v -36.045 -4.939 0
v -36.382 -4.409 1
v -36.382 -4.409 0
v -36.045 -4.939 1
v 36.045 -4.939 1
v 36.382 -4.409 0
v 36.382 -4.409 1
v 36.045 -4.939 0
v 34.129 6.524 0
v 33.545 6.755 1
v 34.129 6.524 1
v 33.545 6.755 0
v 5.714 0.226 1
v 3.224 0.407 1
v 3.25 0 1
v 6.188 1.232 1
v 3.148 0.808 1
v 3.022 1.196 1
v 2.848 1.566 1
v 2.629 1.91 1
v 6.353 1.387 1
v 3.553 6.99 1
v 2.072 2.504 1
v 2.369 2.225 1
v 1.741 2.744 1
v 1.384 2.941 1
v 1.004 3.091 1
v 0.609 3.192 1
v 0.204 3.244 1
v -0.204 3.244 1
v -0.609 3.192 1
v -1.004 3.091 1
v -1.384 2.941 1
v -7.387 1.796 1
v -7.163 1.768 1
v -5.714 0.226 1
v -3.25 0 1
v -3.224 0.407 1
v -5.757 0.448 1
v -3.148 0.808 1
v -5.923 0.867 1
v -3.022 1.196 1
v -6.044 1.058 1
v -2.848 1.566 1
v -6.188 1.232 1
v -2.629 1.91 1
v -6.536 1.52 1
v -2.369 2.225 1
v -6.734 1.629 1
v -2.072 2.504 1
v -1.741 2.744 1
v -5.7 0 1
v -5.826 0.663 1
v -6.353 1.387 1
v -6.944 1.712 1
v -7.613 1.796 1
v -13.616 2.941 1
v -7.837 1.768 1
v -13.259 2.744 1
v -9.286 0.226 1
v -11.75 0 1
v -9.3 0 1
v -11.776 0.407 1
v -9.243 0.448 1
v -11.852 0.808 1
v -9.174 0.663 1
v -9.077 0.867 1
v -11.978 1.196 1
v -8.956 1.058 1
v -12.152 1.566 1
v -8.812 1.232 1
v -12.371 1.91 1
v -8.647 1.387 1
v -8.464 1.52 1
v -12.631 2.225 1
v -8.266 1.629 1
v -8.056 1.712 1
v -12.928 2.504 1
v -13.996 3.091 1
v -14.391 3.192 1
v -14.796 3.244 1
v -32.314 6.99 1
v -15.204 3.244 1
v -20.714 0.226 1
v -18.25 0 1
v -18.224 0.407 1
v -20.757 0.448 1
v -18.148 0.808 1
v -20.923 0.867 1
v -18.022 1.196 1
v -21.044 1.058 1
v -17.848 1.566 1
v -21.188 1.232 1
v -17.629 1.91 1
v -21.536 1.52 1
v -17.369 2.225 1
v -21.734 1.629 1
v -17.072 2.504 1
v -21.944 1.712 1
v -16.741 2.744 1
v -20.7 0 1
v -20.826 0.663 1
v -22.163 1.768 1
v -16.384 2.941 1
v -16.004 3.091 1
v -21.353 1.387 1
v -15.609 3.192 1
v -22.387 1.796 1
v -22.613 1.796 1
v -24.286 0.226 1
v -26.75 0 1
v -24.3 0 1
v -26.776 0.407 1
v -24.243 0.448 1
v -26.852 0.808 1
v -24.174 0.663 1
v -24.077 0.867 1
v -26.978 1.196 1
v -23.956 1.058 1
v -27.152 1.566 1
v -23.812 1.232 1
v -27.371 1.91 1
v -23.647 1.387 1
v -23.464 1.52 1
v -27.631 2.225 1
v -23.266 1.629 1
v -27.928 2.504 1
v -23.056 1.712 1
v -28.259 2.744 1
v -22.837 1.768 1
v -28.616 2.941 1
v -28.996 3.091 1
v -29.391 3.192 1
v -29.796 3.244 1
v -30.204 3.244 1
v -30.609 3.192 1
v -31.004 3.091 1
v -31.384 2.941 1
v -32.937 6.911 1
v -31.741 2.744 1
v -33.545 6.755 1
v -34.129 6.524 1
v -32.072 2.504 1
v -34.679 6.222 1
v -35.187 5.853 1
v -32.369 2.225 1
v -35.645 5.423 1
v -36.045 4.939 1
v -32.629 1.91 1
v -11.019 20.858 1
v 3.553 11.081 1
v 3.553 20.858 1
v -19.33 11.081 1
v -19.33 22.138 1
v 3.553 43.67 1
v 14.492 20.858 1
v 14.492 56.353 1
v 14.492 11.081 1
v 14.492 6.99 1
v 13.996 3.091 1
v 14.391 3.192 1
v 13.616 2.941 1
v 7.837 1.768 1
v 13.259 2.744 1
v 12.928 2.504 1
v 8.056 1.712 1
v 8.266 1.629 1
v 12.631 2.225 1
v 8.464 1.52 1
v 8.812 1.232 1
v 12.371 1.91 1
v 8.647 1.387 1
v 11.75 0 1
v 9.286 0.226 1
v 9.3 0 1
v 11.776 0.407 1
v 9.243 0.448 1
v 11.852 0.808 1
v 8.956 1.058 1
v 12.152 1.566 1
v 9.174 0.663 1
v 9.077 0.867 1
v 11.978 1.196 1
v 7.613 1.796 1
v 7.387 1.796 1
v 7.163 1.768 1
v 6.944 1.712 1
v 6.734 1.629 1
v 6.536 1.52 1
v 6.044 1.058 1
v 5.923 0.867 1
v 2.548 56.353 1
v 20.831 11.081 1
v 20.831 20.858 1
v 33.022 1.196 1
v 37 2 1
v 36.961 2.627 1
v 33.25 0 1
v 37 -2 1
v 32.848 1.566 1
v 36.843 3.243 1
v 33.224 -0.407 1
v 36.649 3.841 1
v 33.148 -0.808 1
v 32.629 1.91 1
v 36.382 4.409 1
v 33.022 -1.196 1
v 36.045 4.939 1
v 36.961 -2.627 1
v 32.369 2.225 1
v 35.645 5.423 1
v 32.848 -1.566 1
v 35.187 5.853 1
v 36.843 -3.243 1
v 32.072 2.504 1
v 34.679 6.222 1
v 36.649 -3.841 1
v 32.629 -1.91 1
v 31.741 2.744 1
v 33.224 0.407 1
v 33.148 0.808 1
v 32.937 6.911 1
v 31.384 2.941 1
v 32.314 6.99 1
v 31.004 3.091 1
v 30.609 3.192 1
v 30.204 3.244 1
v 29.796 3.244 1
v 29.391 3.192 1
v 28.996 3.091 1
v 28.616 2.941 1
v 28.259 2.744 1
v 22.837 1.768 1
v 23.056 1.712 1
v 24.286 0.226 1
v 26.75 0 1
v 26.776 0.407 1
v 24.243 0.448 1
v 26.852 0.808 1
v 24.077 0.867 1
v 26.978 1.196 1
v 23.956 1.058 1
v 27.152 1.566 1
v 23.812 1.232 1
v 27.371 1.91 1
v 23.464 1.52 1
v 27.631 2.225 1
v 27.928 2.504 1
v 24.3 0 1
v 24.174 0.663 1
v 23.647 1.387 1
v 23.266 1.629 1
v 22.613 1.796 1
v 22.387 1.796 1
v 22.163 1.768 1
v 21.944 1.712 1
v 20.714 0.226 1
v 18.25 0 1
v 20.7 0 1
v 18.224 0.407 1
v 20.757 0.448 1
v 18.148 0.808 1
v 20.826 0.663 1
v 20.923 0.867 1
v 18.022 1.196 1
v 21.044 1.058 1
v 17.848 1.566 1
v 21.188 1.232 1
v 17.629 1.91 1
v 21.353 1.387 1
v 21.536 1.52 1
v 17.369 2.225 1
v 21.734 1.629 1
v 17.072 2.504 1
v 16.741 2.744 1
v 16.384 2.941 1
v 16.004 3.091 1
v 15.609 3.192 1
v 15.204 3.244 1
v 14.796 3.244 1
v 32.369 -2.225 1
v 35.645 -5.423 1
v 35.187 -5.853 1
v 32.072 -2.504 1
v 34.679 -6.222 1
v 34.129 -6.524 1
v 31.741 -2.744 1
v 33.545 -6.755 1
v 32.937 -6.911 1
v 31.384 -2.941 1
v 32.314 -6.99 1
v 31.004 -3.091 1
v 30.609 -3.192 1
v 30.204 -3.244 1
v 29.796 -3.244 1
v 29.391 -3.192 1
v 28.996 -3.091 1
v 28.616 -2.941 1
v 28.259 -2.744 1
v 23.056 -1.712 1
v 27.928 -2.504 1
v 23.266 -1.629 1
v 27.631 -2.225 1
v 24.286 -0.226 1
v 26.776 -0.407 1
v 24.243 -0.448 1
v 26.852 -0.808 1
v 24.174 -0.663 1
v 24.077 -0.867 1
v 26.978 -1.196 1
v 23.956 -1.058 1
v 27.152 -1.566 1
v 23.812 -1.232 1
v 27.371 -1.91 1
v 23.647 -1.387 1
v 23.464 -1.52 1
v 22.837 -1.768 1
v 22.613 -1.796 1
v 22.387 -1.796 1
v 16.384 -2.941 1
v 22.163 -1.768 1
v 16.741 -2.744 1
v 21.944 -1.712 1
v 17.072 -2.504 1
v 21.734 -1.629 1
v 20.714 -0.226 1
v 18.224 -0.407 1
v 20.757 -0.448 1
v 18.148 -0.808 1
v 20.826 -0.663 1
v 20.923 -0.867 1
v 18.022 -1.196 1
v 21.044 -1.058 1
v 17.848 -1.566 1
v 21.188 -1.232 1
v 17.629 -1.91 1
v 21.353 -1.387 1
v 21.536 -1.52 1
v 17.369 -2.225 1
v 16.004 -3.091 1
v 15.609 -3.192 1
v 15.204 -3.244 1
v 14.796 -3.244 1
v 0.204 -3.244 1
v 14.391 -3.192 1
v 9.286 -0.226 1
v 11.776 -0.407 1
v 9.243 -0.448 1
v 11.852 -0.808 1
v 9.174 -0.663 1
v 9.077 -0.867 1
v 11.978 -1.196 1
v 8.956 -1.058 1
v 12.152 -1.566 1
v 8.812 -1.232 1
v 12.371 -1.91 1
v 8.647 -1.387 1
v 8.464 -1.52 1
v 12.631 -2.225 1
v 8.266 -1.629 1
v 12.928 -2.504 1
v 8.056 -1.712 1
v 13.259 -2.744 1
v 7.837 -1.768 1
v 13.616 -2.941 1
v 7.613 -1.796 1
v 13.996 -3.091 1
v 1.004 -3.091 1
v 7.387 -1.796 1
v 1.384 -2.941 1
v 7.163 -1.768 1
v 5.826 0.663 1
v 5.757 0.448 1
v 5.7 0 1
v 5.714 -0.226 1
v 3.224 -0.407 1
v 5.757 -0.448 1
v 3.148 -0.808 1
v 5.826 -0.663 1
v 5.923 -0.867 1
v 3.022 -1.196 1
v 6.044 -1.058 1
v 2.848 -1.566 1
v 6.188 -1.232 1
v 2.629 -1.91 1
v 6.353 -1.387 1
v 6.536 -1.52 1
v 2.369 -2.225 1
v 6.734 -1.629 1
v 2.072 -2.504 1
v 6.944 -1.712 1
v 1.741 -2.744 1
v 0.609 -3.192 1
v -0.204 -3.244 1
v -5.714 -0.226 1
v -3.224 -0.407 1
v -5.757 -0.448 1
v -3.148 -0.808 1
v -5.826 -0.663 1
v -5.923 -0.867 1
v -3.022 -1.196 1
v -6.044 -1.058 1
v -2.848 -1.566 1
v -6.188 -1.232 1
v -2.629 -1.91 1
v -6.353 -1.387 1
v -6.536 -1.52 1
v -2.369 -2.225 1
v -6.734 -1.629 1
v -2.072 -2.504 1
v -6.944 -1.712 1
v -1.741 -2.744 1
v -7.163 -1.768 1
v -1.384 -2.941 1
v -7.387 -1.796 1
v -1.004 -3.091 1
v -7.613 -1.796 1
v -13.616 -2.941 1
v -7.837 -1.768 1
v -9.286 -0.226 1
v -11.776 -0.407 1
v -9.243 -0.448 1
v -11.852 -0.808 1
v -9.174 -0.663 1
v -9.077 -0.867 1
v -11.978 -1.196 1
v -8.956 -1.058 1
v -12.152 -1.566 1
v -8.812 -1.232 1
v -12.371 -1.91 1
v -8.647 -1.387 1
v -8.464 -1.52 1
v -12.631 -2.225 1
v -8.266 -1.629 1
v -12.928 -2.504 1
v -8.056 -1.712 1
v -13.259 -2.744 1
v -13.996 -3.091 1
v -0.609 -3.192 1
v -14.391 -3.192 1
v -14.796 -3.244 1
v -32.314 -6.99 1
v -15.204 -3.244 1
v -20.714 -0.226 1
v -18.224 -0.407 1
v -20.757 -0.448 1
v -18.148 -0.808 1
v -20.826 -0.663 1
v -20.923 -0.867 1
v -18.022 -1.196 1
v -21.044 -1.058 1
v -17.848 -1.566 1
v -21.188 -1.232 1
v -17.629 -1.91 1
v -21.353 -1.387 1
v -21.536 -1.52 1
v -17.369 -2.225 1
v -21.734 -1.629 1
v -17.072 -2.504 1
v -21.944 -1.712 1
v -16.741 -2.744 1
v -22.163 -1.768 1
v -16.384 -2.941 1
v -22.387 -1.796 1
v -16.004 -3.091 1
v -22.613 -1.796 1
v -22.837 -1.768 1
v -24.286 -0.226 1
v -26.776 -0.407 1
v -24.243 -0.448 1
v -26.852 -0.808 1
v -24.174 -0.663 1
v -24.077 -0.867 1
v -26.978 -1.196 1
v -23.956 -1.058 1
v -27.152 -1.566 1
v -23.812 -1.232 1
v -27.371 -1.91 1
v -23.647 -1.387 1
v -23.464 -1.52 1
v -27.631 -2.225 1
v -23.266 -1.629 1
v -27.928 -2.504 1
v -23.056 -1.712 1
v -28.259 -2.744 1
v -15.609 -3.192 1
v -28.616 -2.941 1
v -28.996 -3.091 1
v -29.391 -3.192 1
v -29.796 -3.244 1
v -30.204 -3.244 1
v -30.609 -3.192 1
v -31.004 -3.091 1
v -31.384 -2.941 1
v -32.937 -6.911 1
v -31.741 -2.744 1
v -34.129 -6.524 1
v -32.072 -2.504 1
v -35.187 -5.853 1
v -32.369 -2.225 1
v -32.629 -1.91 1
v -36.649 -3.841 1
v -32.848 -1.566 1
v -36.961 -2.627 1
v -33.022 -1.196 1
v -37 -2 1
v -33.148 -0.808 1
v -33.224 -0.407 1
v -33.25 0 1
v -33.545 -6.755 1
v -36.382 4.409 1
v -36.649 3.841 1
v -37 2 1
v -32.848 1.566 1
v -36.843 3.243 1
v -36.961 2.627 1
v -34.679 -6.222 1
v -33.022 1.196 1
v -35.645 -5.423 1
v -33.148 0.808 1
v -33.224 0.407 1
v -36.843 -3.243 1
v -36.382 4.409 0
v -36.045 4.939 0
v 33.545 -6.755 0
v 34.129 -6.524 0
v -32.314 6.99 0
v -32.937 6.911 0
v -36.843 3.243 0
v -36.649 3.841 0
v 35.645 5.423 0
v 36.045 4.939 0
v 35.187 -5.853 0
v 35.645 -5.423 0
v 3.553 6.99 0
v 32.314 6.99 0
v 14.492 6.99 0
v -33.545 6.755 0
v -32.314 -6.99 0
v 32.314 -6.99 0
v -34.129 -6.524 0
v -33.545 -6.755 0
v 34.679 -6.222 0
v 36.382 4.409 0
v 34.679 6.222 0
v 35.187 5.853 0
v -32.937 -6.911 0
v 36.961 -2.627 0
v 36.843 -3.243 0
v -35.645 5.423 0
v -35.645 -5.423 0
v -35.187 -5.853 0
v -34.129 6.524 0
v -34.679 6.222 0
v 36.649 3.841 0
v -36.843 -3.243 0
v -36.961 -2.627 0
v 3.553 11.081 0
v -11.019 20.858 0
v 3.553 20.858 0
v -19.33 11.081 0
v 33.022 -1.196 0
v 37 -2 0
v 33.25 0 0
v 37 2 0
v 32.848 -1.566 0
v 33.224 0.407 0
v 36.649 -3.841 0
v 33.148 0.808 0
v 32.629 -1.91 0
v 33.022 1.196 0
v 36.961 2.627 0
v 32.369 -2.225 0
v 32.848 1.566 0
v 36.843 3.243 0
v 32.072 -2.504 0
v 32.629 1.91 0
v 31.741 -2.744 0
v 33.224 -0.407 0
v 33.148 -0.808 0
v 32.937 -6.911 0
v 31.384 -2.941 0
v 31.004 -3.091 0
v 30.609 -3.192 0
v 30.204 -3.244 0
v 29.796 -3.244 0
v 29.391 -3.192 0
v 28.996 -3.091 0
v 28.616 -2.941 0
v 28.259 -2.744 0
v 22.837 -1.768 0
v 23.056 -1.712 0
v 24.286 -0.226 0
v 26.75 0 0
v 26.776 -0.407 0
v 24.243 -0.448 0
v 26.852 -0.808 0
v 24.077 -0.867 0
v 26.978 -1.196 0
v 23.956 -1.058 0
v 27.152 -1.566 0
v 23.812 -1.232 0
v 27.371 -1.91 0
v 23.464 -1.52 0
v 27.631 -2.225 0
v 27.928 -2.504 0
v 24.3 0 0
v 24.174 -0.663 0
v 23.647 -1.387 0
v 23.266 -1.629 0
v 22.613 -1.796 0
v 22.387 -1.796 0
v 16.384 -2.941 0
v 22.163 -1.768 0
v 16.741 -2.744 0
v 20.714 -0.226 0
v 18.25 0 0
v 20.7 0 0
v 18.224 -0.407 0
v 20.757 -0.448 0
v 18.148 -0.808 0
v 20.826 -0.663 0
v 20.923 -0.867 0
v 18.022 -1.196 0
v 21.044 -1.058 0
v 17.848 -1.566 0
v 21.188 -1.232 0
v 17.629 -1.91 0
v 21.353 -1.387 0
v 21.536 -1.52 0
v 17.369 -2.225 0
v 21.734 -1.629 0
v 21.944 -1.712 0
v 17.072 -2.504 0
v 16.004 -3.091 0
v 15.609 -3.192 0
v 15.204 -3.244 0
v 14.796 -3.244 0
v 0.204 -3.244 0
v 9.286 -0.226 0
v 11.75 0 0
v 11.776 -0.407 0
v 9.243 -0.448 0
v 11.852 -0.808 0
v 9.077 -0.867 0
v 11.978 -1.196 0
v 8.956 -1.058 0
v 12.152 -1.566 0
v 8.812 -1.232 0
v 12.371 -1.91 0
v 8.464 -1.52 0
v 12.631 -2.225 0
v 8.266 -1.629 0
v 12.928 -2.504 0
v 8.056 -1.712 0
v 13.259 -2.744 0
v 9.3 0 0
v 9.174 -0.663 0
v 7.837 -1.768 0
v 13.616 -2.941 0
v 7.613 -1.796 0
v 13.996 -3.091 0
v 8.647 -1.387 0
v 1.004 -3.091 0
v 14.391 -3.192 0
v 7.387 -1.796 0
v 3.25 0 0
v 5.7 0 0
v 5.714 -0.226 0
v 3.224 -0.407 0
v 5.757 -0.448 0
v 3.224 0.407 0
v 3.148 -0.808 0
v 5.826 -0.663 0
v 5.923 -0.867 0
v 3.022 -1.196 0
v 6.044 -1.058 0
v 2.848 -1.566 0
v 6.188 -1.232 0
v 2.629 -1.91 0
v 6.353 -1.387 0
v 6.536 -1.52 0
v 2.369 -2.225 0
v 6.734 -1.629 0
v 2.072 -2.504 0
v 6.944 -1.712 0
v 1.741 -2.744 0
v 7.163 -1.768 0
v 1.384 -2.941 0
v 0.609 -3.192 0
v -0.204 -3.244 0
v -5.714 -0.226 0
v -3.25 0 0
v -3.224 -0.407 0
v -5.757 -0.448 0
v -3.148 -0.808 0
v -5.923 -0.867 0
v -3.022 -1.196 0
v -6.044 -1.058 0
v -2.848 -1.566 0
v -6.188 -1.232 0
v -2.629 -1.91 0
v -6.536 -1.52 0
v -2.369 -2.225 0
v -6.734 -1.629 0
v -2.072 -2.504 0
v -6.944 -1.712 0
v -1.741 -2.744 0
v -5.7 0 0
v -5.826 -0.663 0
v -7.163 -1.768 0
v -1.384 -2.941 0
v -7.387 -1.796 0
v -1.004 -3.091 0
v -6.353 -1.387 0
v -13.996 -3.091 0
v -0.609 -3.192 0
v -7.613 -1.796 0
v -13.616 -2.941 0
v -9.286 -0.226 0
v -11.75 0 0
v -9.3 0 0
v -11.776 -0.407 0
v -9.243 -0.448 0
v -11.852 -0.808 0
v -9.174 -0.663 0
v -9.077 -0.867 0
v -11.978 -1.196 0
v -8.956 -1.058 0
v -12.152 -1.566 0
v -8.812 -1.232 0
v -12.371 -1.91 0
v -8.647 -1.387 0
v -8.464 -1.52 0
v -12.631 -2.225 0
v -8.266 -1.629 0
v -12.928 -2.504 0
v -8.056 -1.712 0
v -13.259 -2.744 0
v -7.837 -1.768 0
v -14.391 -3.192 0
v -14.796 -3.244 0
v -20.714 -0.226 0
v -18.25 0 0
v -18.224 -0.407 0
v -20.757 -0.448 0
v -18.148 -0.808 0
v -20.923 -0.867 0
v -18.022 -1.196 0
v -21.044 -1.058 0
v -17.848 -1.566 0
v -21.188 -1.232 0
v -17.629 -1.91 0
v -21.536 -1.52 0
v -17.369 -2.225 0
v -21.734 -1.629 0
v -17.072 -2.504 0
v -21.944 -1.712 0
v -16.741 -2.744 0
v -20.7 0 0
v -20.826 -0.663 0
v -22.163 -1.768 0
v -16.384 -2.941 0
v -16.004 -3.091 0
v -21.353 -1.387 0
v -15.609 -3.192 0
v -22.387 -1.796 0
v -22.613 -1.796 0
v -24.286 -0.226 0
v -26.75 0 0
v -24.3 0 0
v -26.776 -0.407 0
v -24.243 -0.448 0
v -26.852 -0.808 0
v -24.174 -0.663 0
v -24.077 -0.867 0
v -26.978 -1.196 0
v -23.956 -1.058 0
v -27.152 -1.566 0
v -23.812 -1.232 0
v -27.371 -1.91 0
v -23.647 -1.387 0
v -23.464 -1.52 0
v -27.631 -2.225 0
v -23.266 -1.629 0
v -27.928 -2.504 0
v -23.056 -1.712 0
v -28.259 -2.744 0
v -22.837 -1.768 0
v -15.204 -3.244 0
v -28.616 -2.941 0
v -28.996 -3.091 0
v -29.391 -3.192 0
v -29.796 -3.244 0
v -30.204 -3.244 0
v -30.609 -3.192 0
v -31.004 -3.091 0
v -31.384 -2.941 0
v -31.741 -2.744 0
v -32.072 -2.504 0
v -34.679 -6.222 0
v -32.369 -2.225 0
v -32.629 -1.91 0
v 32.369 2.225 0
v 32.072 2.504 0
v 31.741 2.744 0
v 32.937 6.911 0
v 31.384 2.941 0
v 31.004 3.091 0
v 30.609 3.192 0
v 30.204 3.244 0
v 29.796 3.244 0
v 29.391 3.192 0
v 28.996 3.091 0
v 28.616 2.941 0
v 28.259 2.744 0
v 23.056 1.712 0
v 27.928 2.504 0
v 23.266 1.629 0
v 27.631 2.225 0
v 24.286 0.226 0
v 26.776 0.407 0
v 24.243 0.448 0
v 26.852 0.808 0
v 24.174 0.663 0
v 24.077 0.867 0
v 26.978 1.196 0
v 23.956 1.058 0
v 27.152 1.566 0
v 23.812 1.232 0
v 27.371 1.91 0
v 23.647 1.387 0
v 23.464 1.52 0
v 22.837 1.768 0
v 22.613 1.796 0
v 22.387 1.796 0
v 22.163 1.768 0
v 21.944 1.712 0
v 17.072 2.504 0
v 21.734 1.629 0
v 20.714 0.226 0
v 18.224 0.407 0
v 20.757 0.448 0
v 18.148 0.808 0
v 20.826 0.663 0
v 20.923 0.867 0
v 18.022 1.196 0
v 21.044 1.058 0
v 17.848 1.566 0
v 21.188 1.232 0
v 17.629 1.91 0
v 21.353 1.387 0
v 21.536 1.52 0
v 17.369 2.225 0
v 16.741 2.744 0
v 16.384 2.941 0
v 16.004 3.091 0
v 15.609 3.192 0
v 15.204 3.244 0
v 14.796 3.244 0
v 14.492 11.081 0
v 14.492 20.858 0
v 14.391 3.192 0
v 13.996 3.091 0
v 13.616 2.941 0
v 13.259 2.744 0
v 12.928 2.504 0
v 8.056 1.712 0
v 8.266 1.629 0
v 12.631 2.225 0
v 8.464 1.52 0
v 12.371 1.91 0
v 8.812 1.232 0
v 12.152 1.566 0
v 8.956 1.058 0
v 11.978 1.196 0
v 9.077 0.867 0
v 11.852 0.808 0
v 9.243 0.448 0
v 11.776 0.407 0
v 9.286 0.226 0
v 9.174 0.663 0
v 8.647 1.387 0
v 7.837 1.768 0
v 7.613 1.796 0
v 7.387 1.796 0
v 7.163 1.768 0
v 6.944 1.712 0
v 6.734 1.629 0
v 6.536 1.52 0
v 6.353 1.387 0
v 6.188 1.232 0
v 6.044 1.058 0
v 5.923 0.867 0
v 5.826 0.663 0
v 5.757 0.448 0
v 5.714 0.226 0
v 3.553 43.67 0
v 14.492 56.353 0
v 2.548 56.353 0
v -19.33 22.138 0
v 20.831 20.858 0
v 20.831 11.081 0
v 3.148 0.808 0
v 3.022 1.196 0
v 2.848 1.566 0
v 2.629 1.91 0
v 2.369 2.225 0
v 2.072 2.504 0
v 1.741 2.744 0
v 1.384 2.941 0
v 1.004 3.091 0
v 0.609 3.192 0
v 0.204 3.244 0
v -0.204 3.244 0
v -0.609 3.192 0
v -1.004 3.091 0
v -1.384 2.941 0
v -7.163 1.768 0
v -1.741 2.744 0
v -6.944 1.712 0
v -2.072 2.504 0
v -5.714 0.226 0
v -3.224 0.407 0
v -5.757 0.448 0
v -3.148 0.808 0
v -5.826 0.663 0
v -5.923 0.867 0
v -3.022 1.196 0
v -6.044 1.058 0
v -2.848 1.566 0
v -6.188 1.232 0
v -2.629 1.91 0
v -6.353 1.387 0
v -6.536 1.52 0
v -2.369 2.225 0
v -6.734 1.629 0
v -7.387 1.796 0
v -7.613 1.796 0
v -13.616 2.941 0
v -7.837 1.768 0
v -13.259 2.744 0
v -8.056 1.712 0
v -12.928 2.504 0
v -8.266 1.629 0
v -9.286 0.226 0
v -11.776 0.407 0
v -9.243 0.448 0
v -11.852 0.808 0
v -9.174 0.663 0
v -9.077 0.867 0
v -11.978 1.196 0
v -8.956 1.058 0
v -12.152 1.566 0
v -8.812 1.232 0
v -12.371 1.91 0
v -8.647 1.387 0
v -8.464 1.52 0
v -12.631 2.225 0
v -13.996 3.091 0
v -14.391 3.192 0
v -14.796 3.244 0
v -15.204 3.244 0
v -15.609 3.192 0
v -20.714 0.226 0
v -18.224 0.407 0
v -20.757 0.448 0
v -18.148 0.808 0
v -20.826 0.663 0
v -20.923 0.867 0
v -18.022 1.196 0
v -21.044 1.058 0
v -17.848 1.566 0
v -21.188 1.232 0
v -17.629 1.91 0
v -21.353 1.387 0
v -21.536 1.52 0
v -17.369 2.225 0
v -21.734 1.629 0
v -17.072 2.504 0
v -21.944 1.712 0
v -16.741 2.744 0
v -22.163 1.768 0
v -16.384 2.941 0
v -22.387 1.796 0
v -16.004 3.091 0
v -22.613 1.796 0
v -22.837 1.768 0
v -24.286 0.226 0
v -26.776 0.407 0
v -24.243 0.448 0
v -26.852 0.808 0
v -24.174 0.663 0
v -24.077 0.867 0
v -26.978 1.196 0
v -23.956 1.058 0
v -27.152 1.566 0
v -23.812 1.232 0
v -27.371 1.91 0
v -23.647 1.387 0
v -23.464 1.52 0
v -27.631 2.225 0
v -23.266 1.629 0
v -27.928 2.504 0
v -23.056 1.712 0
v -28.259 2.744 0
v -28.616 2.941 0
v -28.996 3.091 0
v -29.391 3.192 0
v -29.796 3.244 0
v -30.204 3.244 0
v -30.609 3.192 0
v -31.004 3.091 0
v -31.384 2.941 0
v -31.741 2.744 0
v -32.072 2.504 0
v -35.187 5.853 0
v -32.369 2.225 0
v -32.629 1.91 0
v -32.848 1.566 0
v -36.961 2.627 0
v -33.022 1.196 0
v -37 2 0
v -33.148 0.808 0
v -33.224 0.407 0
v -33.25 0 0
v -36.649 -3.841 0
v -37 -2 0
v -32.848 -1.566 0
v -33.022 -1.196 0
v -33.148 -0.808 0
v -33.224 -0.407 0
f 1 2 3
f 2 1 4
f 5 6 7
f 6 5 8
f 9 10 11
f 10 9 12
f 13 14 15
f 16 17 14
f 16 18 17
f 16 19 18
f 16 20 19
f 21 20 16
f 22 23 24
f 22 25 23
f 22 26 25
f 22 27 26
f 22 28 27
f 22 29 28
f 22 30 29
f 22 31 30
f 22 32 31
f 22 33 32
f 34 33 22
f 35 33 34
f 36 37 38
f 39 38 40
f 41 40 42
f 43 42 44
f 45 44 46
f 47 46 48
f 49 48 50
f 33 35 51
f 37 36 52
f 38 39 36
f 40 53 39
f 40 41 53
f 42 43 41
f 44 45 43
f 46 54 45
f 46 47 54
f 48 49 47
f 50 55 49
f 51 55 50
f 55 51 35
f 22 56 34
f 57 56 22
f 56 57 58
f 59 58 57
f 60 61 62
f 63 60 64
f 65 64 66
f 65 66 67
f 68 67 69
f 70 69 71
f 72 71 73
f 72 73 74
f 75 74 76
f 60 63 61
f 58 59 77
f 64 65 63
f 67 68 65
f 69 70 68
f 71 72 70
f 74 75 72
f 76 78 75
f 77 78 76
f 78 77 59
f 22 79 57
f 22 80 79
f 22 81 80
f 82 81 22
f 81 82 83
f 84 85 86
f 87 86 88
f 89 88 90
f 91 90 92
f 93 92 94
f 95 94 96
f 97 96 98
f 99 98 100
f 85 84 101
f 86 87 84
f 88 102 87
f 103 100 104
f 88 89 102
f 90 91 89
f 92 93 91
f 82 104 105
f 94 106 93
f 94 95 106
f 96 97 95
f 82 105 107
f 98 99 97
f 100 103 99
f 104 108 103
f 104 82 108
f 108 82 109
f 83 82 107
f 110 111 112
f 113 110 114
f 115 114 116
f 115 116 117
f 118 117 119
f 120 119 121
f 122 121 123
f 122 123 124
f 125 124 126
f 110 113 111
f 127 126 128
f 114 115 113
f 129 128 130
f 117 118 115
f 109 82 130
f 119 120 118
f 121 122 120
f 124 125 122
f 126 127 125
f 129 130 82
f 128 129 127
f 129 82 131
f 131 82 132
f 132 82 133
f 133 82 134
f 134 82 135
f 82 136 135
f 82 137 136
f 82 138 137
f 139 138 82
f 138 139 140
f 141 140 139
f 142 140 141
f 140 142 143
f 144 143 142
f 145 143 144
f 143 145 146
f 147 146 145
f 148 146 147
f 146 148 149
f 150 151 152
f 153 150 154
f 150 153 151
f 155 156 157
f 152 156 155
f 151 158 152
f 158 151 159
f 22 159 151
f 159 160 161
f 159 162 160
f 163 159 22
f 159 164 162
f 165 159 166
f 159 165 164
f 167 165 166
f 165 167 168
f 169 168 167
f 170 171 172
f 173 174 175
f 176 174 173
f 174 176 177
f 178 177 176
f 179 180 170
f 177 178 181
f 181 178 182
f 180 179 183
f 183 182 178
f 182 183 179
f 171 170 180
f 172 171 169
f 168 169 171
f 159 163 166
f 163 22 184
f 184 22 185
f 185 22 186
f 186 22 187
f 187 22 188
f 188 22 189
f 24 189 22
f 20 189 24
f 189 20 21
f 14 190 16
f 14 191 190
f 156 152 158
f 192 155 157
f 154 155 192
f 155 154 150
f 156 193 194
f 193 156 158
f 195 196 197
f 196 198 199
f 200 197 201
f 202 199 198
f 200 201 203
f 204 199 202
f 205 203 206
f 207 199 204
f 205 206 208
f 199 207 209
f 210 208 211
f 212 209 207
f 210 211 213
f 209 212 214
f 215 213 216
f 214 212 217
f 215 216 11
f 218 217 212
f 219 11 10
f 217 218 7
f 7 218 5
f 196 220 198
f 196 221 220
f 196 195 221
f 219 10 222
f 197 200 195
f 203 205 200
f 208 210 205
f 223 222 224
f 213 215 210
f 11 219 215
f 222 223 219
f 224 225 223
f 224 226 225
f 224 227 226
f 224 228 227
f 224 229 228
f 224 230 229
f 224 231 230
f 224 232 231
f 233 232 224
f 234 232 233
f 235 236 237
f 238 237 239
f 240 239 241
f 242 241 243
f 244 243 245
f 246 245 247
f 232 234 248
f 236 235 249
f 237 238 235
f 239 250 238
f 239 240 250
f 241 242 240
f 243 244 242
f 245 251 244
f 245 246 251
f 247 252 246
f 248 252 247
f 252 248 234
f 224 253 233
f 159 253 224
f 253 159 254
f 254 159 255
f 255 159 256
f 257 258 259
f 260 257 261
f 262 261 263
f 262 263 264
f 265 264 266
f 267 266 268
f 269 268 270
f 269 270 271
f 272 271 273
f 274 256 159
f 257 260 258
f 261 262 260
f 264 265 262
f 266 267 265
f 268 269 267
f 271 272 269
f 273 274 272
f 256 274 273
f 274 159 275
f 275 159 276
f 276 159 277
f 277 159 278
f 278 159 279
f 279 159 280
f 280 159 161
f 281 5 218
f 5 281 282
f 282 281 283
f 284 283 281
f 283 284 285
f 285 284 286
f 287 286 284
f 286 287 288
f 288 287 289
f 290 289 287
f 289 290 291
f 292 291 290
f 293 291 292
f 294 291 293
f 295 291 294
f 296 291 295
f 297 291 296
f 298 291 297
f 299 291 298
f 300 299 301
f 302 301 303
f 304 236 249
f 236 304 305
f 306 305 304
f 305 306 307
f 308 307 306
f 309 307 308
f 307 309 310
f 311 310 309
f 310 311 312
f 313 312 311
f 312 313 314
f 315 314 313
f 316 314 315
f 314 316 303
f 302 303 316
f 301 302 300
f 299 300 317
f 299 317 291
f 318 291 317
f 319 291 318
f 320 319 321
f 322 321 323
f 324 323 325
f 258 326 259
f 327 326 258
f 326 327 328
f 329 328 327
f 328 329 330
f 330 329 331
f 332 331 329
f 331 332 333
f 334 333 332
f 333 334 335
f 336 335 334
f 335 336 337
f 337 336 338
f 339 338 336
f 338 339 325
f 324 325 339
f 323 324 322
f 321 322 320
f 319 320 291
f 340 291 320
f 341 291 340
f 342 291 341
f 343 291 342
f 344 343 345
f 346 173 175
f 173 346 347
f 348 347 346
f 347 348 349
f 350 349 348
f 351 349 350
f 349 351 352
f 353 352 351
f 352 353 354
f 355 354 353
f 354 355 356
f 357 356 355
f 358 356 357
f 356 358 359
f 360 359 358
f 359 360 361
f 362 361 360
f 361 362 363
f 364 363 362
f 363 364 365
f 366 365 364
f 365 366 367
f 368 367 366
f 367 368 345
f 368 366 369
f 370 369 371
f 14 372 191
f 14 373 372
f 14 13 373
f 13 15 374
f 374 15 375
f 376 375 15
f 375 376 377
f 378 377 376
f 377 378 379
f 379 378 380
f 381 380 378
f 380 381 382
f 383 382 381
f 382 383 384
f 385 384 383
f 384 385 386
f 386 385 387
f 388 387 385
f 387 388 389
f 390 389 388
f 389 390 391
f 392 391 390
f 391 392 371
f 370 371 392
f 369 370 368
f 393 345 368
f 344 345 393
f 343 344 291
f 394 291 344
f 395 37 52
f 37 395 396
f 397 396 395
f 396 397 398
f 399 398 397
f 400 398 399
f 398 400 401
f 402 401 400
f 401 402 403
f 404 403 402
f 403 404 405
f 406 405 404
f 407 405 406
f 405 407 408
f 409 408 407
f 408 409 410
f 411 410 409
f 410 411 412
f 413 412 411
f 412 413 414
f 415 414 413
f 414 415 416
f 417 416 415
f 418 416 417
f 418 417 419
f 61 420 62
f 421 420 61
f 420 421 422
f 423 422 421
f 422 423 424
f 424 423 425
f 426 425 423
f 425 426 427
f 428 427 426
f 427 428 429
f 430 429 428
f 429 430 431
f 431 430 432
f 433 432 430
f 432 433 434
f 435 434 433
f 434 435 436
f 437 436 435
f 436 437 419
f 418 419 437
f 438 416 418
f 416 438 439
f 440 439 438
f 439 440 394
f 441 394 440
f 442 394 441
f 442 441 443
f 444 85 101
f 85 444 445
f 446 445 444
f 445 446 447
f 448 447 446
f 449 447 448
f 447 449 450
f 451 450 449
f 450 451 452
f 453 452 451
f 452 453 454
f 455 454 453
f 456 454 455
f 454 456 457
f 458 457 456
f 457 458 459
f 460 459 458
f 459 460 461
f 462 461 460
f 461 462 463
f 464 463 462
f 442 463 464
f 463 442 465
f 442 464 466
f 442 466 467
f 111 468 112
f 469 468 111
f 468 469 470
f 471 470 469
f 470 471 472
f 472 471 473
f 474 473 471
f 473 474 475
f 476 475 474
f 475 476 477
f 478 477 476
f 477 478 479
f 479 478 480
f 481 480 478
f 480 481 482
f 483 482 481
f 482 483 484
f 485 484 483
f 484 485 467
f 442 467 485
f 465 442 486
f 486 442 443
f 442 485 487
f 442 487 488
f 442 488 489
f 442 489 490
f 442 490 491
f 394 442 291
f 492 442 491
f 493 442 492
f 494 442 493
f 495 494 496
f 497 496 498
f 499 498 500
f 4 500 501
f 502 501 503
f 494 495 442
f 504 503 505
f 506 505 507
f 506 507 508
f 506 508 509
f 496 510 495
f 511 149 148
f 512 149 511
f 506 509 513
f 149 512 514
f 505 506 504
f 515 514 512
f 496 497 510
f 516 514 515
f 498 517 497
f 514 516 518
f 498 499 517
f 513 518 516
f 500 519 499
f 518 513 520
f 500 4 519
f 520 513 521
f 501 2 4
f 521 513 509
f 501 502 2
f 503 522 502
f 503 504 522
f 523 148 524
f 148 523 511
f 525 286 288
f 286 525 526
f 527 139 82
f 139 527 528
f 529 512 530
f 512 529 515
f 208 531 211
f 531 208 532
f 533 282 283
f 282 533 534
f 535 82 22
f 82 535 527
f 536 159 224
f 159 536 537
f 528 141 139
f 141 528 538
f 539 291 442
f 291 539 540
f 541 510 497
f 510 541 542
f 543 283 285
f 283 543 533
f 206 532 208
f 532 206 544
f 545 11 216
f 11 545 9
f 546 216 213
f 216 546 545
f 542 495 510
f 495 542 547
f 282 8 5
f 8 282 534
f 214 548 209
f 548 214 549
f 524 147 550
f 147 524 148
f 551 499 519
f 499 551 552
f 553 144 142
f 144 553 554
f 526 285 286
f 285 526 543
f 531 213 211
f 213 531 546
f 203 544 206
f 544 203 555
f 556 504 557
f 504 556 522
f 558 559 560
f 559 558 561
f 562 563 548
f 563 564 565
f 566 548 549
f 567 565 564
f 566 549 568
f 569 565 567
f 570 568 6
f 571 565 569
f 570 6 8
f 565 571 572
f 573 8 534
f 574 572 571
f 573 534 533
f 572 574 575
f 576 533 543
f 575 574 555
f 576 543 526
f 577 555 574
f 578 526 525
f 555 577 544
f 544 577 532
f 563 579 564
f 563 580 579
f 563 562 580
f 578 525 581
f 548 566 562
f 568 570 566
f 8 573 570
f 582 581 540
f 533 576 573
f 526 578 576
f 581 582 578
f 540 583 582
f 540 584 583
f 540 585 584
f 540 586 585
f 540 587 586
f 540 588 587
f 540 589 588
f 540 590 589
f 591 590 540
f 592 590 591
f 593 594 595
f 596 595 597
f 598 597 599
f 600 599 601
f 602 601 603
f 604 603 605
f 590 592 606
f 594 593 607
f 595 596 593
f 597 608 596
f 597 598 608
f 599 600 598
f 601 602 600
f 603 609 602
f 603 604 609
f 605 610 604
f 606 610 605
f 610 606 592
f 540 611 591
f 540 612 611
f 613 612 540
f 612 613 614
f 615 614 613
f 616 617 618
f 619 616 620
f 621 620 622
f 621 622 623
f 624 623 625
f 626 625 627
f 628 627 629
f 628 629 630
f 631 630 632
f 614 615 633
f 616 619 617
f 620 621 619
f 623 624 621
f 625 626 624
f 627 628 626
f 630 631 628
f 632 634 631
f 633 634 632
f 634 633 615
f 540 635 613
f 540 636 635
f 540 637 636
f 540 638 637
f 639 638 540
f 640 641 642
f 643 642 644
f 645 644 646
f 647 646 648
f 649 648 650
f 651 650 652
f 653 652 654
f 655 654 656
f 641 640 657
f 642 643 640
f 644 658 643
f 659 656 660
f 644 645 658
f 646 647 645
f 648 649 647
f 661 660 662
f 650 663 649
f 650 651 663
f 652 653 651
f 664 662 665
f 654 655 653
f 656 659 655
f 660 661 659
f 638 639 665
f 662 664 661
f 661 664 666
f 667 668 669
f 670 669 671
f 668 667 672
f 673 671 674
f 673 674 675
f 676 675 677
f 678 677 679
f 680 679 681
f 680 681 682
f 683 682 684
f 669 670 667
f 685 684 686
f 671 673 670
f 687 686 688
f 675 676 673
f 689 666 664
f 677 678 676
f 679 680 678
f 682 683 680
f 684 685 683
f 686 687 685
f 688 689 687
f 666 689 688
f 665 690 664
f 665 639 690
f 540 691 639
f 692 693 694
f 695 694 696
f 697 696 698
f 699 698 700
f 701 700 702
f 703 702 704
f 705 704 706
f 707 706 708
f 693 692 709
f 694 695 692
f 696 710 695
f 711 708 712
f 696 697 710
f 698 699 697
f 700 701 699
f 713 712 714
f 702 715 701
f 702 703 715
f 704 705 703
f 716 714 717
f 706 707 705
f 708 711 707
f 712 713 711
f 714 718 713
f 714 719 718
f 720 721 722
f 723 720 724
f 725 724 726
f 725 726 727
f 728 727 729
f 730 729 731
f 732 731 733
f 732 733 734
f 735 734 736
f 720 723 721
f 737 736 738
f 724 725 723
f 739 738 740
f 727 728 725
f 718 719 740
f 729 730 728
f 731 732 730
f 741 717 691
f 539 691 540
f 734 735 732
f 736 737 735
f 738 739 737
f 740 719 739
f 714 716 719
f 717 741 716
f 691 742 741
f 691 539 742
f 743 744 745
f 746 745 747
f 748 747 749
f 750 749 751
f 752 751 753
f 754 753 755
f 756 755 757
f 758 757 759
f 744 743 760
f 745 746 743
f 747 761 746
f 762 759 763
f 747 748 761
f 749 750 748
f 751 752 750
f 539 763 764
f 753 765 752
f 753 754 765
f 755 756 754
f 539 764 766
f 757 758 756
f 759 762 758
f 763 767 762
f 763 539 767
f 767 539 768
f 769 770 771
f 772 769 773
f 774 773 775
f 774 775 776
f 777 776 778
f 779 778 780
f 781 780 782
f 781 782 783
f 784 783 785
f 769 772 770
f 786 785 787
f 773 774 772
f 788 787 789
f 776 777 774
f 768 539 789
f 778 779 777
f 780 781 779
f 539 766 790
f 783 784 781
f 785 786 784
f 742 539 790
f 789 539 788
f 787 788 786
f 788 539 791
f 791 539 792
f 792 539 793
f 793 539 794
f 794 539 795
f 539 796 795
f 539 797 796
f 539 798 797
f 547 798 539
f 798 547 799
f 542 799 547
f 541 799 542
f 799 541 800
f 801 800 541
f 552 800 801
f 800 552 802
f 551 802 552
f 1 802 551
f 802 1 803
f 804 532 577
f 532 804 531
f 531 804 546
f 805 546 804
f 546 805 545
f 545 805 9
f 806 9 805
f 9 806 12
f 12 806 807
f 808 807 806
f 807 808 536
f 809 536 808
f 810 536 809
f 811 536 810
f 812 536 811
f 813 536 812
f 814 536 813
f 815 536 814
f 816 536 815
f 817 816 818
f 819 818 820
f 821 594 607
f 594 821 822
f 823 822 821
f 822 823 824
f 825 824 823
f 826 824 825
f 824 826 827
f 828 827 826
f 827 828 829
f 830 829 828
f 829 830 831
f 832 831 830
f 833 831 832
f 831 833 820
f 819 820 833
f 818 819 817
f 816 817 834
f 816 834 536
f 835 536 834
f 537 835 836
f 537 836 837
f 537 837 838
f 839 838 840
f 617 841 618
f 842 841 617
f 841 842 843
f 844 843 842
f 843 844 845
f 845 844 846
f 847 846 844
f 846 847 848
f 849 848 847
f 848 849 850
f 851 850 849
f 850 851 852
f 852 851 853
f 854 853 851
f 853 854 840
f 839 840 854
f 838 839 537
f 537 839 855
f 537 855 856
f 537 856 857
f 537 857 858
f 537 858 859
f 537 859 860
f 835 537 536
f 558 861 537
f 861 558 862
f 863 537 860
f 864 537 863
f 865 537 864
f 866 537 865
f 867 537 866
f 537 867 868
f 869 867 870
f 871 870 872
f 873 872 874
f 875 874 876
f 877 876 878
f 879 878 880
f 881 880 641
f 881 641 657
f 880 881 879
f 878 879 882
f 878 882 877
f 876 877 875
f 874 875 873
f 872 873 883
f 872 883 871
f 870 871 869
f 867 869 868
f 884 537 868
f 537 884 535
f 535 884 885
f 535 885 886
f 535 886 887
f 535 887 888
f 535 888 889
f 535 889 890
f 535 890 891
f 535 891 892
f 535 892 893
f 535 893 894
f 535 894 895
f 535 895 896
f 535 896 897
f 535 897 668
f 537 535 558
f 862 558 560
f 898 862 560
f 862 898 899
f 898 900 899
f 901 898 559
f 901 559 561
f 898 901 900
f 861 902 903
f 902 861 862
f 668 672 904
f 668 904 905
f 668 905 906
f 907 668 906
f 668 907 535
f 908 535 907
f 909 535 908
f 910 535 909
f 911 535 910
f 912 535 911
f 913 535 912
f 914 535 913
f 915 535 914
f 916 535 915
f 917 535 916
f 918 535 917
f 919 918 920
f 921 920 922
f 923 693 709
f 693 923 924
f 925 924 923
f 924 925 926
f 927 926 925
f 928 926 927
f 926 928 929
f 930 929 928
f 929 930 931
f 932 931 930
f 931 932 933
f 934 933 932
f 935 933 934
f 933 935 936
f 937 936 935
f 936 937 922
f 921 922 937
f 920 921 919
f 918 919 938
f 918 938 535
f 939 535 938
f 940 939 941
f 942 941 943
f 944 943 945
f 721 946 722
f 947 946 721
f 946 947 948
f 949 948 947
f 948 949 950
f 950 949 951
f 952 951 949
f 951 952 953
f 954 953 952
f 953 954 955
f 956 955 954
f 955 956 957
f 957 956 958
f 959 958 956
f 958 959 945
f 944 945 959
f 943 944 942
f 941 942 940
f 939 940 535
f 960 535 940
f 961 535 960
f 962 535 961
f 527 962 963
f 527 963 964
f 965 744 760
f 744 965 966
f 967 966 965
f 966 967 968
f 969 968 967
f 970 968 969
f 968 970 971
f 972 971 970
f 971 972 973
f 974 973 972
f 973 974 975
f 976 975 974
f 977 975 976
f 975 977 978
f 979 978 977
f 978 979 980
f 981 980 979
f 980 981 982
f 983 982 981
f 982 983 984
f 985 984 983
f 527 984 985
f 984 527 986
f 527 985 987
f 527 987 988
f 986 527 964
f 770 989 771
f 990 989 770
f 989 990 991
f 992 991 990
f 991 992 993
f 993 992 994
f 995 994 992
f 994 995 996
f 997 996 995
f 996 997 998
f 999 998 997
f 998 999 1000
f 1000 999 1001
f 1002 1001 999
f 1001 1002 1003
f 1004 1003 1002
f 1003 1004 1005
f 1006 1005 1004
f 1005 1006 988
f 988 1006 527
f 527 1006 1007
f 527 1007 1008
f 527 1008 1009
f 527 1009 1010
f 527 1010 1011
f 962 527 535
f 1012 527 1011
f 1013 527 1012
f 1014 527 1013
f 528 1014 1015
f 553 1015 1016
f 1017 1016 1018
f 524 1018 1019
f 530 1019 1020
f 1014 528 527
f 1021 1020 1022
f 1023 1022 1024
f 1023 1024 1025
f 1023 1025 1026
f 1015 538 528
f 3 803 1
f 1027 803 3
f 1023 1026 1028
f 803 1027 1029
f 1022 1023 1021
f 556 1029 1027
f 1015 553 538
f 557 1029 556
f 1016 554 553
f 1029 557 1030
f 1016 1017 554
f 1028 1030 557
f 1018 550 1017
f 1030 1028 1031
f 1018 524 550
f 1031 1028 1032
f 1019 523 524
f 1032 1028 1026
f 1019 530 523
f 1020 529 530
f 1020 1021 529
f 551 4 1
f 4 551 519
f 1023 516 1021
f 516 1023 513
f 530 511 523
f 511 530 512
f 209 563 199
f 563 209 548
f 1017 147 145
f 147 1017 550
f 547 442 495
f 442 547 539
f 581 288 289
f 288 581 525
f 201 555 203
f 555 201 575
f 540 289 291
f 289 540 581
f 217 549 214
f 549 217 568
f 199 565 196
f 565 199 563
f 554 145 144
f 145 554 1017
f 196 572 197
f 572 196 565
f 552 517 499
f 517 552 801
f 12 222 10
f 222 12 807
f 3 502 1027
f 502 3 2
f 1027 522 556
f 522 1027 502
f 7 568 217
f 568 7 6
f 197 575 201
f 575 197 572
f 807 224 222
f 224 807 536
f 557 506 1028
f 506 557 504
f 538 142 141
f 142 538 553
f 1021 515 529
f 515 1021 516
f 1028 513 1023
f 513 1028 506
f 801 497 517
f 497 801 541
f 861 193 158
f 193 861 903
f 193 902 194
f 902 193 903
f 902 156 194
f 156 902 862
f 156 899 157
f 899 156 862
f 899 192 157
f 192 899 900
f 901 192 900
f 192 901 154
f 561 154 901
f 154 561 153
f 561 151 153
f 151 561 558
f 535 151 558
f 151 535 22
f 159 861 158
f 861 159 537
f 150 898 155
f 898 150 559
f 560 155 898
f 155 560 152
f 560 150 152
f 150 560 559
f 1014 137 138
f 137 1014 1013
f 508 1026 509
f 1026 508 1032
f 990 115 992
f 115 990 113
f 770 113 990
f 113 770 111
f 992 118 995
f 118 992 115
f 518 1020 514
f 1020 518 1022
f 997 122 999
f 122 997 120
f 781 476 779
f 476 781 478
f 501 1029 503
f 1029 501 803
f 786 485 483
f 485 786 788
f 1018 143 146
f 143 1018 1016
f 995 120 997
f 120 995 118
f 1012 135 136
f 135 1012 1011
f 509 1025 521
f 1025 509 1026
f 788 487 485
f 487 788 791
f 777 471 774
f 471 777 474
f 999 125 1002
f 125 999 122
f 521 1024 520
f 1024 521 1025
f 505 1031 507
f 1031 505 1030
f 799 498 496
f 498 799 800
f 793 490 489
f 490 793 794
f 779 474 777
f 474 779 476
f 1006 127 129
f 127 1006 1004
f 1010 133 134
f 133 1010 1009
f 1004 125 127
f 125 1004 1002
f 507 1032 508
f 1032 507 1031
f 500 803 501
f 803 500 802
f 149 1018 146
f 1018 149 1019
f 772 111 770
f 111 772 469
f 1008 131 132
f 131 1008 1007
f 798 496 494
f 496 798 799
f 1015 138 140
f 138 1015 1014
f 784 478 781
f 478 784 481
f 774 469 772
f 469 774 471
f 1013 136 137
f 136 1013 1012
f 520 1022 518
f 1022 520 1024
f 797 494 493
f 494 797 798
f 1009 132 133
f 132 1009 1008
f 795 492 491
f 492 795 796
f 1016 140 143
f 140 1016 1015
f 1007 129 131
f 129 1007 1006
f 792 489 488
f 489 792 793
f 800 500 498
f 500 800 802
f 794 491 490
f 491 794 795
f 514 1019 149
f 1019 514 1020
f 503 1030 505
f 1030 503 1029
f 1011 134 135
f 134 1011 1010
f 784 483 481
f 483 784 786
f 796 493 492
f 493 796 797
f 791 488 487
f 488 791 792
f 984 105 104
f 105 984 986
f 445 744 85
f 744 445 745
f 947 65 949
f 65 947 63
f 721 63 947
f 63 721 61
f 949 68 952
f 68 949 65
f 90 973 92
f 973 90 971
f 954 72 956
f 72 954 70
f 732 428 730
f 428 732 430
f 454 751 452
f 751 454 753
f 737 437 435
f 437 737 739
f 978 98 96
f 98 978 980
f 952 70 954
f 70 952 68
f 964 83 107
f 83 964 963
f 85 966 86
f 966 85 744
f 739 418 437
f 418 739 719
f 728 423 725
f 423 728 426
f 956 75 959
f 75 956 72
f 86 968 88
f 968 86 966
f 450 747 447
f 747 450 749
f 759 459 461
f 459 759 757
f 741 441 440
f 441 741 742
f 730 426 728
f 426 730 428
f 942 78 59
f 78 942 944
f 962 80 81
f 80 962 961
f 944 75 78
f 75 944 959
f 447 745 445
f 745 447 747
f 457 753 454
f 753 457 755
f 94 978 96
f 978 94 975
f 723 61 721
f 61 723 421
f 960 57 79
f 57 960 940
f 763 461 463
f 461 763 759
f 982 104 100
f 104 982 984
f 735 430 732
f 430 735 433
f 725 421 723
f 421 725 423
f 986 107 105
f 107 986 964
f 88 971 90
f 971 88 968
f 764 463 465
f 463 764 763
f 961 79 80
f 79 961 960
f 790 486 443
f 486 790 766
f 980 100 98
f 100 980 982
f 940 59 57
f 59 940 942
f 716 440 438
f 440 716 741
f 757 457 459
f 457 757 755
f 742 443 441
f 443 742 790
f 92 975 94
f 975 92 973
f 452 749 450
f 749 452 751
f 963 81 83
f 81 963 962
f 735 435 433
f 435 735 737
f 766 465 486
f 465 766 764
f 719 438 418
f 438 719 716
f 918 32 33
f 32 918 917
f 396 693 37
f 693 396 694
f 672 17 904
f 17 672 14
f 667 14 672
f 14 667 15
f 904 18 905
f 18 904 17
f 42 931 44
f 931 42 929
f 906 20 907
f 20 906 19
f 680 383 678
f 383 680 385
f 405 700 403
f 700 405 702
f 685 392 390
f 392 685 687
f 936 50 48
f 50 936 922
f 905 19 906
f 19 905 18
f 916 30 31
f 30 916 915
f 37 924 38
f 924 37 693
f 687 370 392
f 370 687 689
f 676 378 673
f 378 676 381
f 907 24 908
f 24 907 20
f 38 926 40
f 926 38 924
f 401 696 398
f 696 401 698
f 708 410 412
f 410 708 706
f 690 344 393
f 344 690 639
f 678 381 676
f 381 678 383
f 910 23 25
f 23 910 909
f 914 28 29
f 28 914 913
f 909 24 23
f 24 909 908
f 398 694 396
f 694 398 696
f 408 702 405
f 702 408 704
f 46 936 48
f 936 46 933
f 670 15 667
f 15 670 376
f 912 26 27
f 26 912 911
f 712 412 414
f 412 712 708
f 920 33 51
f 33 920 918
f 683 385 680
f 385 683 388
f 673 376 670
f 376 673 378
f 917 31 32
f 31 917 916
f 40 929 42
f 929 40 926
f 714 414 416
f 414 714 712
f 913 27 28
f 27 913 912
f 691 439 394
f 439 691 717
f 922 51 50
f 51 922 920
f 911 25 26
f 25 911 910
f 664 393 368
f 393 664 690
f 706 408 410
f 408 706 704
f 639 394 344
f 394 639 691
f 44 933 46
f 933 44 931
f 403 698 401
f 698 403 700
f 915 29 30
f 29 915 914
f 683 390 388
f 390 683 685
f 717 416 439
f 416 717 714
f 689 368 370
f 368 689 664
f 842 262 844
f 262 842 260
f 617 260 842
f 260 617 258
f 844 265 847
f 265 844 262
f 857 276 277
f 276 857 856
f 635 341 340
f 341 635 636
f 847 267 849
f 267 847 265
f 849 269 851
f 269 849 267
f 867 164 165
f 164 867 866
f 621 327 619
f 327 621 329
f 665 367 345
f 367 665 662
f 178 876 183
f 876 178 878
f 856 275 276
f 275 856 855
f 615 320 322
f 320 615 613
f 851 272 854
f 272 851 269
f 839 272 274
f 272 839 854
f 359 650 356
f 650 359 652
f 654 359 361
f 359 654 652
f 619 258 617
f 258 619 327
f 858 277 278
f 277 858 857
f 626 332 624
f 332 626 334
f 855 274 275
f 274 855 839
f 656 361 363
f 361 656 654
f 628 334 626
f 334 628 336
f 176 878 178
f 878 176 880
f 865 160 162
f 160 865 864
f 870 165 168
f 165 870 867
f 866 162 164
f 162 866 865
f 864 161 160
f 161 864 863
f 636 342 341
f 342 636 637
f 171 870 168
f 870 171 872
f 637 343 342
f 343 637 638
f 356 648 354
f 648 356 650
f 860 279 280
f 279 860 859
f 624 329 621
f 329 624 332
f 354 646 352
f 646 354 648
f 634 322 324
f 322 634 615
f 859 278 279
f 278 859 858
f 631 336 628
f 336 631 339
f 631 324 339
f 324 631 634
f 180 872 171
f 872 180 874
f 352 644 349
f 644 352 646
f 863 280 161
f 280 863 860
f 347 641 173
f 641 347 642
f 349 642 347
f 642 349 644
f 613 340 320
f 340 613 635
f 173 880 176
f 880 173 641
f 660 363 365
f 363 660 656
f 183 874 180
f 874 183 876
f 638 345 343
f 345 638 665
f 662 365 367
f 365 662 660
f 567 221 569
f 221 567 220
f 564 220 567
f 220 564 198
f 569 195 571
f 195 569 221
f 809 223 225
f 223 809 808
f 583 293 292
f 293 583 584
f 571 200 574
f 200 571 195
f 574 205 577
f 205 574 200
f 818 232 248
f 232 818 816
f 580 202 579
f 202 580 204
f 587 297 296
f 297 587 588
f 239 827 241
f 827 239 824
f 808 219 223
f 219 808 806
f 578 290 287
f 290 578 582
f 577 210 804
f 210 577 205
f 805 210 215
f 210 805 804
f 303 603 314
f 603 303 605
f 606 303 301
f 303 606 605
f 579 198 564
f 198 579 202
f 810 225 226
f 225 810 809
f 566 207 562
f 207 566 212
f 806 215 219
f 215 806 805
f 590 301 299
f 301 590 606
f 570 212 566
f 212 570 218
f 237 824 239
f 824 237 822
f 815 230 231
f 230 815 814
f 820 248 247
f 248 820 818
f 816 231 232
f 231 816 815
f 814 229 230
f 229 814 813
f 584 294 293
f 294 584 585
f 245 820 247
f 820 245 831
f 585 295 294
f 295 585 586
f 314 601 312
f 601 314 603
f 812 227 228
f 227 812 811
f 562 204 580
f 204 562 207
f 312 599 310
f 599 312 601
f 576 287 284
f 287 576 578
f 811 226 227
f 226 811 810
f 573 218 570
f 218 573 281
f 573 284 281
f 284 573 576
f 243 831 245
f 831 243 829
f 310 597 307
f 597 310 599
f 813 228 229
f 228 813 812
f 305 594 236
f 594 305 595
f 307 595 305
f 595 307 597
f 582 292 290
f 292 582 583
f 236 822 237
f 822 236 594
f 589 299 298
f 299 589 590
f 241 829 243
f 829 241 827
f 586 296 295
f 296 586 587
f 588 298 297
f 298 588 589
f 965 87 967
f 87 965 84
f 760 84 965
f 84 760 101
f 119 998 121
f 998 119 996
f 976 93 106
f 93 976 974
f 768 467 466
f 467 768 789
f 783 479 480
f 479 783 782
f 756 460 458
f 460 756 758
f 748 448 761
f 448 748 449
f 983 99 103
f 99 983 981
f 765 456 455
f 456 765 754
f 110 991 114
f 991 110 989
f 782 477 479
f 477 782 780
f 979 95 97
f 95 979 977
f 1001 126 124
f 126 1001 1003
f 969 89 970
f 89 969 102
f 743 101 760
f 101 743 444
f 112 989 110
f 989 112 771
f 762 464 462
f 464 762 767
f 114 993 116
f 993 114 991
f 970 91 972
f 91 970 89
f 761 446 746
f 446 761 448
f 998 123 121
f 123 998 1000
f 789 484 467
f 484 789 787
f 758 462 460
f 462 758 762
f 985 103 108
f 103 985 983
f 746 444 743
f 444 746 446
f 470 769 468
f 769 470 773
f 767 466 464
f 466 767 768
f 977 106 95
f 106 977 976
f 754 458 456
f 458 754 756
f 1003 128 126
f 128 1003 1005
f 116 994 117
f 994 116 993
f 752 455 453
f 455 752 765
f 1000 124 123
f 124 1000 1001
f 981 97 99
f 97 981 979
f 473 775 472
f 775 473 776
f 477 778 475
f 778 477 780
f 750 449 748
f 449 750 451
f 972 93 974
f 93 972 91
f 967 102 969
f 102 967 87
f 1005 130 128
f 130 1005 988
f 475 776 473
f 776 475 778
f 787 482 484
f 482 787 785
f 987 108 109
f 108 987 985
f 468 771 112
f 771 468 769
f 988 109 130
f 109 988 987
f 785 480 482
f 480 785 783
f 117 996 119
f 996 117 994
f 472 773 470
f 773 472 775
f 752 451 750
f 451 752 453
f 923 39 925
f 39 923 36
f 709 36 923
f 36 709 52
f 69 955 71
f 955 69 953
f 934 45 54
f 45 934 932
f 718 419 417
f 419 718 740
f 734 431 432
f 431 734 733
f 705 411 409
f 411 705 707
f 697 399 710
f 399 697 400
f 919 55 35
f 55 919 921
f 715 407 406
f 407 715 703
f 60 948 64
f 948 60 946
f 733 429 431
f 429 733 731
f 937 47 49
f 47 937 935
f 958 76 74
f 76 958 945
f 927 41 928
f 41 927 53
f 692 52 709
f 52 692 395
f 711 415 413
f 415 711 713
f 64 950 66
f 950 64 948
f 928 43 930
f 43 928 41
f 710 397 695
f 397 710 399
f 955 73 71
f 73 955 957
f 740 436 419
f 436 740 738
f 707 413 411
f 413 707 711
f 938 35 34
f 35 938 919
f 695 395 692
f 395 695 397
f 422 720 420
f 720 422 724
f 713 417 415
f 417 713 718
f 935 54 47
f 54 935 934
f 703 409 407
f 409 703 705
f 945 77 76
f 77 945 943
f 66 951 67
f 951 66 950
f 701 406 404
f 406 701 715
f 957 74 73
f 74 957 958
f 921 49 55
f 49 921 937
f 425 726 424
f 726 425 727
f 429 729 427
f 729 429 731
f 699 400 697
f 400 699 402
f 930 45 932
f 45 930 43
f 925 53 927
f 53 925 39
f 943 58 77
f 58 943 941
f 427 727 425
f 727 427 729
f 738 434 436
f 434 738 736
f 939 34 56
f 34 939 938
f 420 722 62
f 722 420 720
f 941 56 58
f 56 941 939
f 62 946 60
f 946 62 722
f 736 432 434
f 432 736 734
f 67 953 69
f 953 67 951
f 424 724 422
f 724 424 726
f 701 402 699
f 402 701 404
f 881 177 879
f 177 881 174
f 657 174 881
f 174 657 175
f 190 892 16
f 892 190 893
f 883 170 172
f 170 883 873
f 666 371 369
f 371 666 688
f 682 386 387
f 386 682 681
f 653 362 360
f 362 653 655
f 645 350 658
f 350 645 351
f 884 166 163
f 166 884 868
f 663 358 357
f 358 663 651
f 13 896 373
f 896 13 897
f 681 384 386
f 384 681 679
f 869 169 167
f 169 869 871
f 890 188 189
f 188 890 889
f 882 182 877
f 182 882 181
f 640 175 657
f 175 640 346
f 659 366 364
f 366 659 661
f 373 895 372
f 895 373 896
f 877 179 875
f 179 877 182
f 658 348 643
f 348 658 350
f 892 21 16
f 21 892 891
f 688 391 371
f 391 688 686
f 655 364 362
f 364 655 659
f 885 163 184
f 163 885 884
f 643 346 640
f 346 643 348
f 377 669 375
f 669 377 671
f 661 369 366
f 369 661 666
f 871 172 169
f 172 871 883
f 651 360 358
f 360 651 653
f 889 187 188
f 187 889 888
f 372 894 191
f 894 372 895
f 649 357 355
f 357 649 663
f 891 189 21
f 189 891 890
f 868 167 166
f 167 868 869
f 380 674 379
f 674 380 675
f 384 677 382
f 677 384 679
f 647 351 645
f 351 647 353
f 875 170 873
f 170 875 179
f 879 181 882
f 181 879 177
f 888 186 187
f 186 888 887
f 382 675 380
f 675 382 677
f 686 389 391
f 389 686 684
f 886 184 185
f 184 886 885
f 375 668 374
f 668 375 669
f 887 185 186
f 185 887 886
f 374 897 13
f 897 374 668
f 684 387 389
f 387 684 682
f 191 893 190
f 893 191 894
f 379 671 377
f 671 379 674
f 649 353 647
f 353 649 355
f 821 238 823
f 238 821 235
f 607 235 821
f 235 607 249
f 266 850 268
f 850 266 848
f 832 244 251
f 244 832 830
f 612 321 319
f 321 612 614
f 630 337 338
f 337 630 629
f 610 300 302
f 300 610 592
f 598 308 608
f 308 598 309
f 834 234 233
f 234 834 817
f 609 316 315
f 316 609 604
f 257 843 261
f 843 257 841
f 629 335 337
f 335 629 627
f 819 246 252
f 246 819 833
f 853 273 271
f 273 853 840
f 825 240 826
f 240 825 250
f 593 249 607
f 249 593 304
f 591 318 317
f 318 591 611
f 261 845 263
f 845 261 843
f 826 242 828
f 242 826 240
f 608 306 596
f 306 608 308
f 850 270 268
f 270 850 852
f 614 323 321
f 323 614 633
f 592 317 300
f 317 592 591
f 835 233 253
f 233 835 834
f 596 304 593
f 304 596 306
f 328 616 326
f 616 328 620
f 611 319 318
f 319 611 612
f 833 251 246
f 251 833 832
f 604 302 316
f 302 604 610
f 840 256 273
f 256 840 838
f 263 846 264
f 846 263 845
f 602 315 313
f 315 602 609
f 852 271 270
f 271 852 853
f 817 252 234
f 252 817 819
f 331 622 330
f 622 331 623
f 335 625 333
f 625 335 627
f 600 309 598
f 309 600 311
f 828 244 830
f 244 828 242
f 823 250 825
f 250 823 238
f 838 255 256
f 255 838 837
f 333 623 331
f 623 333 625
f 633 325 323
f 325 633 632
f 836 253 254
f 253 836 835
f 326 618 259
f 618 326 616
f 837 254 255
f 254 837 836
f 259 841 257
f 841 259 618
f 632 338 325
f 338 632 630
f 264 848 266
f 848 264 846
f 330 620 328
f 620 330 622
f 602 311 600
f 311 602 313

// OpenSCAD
$fn = 50;


difference() {
	union() {
		hull() {
			translate(v = [-32.0000000000, 2.0000000000, 0]) {
				cylinder(h = 1, r = 5);
			}
			translate(v = [32.0000000000, 2.0000000000, 0]) {
				cylinder(h = 1, r = 5);
			}
			translate(v = [-32.0000000000, -2.0000000000, 0]) {
				cylinder(h = 1, r = 5);
			}
			translate(v = [32.0000000000, -2.0000000000, 0]) {
				cylinder(h = 1, r = 5);
			}
		}
		translate(v = [0, 55, 0]) {
			linear_extrude(height = 1) {
				text(font = "DejaVu Sans Mono:style=Bold", halign = "center", size = 57.0000000000, text = "4", valign = "top");
			}
		}
	}
	union() {
		translate(v = [-30.0000000000, 0.0000000000, 0]) {
			translate(v = [0, 0, -100]) {
				cylinder(h = 200, r = 3.2500000000);
			}
		}
		translate(v = [-15.0000000000, 0.0000000000, 0]) {
			translate(v = [0, 0, -100]) {
				cylinder(h = 200, r = 3.2500000000);
			}
		}
		translate(v = [0, 0, -100]) {
			cylinder(h = 200, r = 3.2500000000);
		}
		translate(v = [15.0000000000, 0.0000000000, 0]) {
			translate(v = [0, 0, -100]) {
				cylinder(h = 200, r = 3.2500000000);
			}
		}
		translate(v = [30.0000000000, 0.0000000000, 0]) {
			translate(v = [0, 0, -100]) {
				cylinder(h = 200, r = 3.2500000000);
			}
		}
		translate(v = [-30.0000000000, 0.0000000000, 0]) {
			translate(v = [0, 0, -100]) {
				cylinder(h = 200, r = 1.8000000000);
			}
		}
		translate(v = [-22.5000000000, 0.0000000000, 0]) {
			translate(v = [0, 0, -100]) {
				cylinder(h = 200, r = 1.8000000000);
			}
		}
		translate(v = [-15.0000000000, 0.0000000000, 0]) {
			translate(v = [0, 0, -100]) {
				cylinder(h = 200, r = 1.8000000000);
			}
		}
		translate(v = [-7.5000000000, 0.0000000000, 0]) {
			translate(v = [0, 0, -100]) {
				cylinder(h = 200, r = 1.8000000000);
			}
		}
		translate(v = [0, 0, -100]) {
			cylinder(h = 200, r = 1.8000000000);
		}
		translate(v = [7.5000000000, 0.0000000000, 0]) {
			translate(v = [0, 0, -100]) {
				cylinder(h = 200, r = 1.8000000000);
			}
		}
		translate(v = [15.0000000000, 0.0000000000, 0]) {
			translate(v = [0, 0, -100]) {
				cylinder(h = 200, r = 1.8000000000);
			}
		}
		translate(v = [22.5000000000, 0.0000000000, 0]) {
			translate(v = [0, 0, -100]) {
				cylinder(h = 200, r = 1.8000000000);
			}
		}
		translate(v = [30.0000000000, 0.0000000000, 0]) {
			translate(v = [0, 0, -100]) {
				cylinder(h = 200, r = 1.8000000000);
			}
		}
	}
}
